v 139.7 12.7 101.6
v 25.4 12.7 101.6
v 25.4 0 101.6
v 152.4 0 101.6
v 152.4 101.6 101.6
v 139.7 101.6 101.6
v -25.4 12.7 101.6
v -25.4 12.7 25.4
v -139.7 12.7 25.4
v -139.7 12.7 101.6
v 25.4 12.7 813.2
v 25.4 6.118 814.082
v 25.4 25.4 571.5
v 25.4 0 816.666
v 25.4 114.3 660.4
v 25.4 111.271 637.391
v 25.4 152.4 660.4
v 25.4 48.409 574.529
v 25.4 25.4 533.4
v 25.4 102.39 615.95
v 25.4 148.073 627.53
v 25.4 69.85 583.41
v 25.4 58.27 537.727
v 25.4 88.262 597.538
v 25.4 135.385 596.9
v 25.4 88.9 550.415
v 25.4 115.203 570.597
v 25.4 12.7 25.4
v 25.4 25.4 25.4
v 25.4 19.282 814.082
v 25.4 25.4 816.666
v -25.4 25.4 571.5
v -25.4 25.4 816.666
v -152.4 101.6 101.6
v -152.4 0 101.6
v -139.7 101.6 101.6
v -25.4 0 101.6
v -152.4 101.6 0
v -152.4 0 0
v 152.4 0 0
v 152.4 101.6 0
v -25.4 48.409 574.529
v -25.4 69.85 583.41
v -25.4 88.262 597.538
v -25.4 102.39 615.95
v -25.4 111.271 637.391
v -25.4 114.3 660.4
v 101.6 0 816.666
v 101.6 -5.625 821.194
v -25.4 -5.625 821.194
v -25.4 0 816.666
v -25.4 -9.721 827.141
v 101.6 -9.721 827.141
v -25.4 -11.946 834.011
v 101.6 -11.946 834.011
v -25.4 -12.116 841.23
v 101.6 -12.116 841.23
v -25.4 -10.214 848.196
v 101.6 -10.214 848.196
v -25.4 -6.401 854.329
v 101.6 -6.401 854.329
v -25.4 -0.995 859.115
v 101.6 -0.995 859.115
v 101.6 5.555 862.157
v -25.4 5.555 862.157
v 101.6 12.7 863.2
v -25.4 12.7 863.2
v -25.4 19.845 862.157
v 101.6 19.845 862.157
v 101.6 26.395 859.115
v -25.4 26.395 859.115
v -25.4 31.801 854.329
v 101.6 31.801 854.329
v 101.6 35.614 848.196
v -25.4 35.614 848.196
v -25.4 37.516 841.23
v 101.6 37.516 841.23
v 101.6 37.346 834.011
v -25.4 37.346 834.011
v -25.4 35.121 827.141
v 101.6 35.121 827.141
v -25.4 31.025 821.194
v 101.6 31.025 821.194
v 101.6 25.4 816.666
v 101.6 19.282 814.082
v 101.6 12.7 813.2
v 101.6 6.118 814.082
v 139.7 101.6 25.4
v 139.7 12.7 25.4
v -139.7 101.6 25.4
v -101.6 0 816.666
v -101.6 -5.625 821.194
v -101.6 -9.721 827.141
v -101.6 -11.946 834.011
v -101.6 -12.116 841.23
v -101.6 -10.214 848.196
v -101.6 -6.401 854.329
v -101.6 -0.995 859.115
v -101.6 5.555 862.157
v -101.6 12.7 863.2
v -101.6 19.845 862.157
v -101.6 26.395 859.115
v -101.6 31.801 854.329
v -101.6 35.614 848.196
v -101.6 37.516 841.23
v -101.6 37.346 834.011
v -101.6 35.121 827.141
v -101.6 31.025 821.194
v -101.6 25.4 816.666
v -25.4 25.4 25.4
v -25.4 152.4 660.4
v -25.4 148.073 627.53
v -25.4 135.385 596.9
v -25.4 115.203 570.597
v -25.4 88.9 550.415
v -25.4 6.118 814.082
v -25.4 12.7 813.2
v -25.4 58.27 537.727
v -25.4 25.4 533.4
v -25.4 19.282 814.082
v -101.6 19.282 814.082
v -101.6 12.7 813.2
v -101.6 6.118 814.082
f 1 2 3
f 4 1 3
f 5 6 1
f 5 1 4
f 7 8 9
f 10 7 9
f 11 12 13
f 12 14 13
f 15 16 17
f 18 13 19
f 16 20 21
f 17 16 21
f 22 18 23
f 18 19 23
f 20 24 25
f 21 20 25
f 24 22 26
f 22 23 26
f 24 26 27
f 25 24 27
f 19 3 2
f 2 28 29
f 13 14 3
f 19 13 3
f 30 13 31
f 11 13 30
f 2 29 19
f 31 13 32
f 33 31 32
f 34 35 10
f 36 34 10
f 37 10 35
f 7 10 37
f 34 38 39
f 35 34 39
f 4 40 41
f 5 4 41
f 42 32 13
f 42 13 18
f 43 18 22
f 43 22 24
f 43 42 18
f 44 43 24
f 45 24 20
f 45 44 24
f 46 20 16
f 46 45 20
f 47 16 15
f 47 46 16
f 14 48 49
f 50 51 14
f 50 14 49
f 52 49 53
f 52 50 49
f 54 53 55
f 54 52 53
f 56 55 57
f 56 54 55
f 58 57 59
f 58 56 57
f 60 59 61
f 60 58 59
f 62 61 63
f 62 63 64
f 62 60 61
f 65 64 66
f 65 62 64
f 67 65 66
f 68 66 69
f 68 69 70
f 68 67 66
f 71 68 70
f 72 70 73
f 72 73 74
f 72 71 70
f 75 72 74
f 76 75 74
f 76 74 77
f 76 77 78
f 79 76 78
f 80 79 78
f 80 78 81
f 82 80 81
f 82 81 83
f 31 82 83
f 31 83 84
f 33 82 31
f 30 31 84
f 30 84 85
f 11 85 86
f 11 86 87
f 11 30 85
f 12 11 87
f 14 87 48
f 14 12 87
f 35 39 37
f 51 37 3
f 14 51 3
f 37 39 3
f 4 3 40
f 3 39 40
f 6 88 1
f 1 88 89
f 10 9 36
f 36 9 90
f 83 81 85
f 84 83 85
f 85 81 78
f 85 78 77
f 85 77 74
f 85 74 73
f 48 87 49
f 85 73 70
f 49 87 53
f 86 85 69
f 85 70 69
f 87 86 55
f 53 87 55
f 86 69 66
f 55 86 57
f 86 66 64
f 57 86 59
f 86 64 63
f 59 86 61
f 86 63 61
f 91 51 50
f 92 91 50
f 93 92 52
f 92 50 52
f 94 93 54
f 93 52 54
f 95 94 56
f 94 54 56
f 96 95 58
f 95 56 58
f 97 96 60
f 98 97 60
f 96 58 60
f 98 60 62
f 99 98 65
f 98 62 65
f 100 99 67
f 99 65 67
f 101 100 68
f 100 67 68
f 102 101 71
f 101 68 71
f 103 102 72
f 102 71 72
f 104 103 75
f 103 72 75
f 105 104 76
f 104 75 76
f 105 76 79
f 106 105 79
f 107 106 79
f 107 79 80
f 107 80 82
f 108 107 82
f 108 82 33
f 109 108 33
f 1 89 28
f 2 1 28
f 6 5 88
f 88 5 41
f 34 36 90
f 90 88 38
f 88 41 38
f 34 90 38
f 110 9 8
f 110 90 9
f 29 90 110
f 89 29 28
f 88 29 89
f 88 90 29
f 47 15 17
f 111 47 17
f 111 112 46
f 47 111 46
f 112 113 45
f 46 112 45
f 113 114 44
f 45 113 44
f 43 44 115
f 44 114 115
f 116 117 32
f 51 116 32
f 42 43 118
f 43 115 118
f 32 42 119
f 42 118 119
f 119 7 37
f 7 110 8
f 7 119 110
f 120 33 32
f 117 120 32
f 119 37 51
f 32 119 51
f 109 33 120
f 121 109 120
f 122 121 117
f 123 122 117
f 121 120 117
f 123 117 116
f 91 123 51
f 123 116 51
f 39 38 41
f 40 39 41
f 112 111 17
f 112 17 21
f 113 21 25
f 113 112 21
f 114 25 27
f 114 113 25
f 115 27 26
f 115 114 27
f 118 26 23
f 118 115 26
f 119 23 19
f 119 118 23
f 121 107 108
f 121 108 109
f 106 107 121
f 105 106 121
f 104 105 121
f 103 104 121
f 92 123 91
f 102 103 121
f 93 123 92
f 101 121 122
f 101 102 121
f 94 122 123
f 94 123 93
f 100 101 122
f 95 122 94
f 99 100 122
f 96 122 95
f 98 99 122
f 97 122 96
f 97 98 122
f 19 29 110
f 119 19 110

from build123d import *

# Parameters (mm, degrees)
F1_DEPTH = 25.4
F2_DEPTH = 101.6
F3_DEPTH = 838.2
F5_DEPTH = 50.8
F6_DEPTH = 76.2
F7_DEPTH = 127


with BuildPart() as f1:
    # F0 (on Top) → F1 (new body)
    with BuildSketch(Plane.XY):
        Polygon((-139.7, 12.7), (-25.4, 12.7), (-25.4, 25.4), (25.4, 25.4), (25.4, 12.7), (139.7, 12.7), (139.7, 101.6), (-139.7, 101.6), align=None)
    extrude(amount=F1_DEPTH)

    # F0 (on Top) → F2 (join)
    with BuildSketch(Plane.XY):
        Polygon((-152.4, 0), (-25.4, 0), (-25.4, 12.7), (-139.7, 12.7), (-139.7, 101.6), (-152.4, 101.6), align=None)
        Polygon((25.4, 12.7), (25.4, 0), (152.4, 0), (152.4, 101.6), (139.7, 101.6), (139.7, 12.7), align=None)
    extrude(amount=F2_DEPTH)

    # F0 (on Top) → F3 (join)
    with BuildSketch(Plane.XY):
        Polygon((-25.4, 0), (0, 0), (25.4, 0), (25.4, 12.7), (25.4, 25.4), (-25.4, 25.4), (-25.4, 12.7), align=None)
    extrude(amount=F3_DEPTH)

    # F4 (on face) → F5 (join)
    with BuildSketch(Plane(origin=(-25.4, 0, 0), x_dir=(0, -1, 0), z_dir=(-1, 0, 0))):
        with BuildLine():
            Line((-25.4, 533.4), (-25.4, 571.5))
            ThreePointArc((-25.4, 571.5), (-88.2617928475, 597.5382071525), (-114.3, 660.4))
            Line((-114.3, 660.4), (-152.4, 660.4))
            ThreePointArc((-152.4, 660.4), (-115.2025612107, 570.5974387893), (-25.4, 533.4))
        make_face()
    extrude(amount=-F5_DEPTH)



with BuildPart() as f6:
    # F4 (on face) → F6 (new body)
    with BuildSketch(Plane(origin=(-25.4, 0, 0), x_dir=(0, -1, 0), z_dir=(-1, 0, 0))):
        with BuildLine():
            ThreePointArc((0, 816.6661313275), (9.0082572424, 825.8004408344), (12.29995, 838.2))
            ThreePointArc((12.29995, 838.2), (-25.0995591656, 859.9082572424), (-25.4, 816.6661313275))
            Line((-25.4, 816.6661313275), (-25.4, 838.2))
            Line((-25.4, 838.2), (0, 838.2))
            Line((0, 838.2), (0, 816.6661313275))
        make_face()
        with BuildLine():
            Line((-25.4, 838.2), (-25.4, 816.6661313275))
            ThreePointArc((-25.4, 816.6661313275), (-12.7, 813.20005), (0, 816.6661313275))
            Line((0, 816.6661313275), (0, 838.2))
            Line((0, 838.2), (-25.4, 838.2))
        make_face()
    extrude(amount=F6_DEPTH)


with BuildPart() as f1_1:
    add(f1.part)
    # F7 (add): a face of the model
    f7_faces = [f6.part.faces().sort_by_distance(p)[0] for p in [
        (-25.4, 12.7, 838.2),
    ]]

    add(f6.part)  # F7 merges F6
    extrude(f7_faces, amount=F7_DEPTH)


solid = f1_1.part
